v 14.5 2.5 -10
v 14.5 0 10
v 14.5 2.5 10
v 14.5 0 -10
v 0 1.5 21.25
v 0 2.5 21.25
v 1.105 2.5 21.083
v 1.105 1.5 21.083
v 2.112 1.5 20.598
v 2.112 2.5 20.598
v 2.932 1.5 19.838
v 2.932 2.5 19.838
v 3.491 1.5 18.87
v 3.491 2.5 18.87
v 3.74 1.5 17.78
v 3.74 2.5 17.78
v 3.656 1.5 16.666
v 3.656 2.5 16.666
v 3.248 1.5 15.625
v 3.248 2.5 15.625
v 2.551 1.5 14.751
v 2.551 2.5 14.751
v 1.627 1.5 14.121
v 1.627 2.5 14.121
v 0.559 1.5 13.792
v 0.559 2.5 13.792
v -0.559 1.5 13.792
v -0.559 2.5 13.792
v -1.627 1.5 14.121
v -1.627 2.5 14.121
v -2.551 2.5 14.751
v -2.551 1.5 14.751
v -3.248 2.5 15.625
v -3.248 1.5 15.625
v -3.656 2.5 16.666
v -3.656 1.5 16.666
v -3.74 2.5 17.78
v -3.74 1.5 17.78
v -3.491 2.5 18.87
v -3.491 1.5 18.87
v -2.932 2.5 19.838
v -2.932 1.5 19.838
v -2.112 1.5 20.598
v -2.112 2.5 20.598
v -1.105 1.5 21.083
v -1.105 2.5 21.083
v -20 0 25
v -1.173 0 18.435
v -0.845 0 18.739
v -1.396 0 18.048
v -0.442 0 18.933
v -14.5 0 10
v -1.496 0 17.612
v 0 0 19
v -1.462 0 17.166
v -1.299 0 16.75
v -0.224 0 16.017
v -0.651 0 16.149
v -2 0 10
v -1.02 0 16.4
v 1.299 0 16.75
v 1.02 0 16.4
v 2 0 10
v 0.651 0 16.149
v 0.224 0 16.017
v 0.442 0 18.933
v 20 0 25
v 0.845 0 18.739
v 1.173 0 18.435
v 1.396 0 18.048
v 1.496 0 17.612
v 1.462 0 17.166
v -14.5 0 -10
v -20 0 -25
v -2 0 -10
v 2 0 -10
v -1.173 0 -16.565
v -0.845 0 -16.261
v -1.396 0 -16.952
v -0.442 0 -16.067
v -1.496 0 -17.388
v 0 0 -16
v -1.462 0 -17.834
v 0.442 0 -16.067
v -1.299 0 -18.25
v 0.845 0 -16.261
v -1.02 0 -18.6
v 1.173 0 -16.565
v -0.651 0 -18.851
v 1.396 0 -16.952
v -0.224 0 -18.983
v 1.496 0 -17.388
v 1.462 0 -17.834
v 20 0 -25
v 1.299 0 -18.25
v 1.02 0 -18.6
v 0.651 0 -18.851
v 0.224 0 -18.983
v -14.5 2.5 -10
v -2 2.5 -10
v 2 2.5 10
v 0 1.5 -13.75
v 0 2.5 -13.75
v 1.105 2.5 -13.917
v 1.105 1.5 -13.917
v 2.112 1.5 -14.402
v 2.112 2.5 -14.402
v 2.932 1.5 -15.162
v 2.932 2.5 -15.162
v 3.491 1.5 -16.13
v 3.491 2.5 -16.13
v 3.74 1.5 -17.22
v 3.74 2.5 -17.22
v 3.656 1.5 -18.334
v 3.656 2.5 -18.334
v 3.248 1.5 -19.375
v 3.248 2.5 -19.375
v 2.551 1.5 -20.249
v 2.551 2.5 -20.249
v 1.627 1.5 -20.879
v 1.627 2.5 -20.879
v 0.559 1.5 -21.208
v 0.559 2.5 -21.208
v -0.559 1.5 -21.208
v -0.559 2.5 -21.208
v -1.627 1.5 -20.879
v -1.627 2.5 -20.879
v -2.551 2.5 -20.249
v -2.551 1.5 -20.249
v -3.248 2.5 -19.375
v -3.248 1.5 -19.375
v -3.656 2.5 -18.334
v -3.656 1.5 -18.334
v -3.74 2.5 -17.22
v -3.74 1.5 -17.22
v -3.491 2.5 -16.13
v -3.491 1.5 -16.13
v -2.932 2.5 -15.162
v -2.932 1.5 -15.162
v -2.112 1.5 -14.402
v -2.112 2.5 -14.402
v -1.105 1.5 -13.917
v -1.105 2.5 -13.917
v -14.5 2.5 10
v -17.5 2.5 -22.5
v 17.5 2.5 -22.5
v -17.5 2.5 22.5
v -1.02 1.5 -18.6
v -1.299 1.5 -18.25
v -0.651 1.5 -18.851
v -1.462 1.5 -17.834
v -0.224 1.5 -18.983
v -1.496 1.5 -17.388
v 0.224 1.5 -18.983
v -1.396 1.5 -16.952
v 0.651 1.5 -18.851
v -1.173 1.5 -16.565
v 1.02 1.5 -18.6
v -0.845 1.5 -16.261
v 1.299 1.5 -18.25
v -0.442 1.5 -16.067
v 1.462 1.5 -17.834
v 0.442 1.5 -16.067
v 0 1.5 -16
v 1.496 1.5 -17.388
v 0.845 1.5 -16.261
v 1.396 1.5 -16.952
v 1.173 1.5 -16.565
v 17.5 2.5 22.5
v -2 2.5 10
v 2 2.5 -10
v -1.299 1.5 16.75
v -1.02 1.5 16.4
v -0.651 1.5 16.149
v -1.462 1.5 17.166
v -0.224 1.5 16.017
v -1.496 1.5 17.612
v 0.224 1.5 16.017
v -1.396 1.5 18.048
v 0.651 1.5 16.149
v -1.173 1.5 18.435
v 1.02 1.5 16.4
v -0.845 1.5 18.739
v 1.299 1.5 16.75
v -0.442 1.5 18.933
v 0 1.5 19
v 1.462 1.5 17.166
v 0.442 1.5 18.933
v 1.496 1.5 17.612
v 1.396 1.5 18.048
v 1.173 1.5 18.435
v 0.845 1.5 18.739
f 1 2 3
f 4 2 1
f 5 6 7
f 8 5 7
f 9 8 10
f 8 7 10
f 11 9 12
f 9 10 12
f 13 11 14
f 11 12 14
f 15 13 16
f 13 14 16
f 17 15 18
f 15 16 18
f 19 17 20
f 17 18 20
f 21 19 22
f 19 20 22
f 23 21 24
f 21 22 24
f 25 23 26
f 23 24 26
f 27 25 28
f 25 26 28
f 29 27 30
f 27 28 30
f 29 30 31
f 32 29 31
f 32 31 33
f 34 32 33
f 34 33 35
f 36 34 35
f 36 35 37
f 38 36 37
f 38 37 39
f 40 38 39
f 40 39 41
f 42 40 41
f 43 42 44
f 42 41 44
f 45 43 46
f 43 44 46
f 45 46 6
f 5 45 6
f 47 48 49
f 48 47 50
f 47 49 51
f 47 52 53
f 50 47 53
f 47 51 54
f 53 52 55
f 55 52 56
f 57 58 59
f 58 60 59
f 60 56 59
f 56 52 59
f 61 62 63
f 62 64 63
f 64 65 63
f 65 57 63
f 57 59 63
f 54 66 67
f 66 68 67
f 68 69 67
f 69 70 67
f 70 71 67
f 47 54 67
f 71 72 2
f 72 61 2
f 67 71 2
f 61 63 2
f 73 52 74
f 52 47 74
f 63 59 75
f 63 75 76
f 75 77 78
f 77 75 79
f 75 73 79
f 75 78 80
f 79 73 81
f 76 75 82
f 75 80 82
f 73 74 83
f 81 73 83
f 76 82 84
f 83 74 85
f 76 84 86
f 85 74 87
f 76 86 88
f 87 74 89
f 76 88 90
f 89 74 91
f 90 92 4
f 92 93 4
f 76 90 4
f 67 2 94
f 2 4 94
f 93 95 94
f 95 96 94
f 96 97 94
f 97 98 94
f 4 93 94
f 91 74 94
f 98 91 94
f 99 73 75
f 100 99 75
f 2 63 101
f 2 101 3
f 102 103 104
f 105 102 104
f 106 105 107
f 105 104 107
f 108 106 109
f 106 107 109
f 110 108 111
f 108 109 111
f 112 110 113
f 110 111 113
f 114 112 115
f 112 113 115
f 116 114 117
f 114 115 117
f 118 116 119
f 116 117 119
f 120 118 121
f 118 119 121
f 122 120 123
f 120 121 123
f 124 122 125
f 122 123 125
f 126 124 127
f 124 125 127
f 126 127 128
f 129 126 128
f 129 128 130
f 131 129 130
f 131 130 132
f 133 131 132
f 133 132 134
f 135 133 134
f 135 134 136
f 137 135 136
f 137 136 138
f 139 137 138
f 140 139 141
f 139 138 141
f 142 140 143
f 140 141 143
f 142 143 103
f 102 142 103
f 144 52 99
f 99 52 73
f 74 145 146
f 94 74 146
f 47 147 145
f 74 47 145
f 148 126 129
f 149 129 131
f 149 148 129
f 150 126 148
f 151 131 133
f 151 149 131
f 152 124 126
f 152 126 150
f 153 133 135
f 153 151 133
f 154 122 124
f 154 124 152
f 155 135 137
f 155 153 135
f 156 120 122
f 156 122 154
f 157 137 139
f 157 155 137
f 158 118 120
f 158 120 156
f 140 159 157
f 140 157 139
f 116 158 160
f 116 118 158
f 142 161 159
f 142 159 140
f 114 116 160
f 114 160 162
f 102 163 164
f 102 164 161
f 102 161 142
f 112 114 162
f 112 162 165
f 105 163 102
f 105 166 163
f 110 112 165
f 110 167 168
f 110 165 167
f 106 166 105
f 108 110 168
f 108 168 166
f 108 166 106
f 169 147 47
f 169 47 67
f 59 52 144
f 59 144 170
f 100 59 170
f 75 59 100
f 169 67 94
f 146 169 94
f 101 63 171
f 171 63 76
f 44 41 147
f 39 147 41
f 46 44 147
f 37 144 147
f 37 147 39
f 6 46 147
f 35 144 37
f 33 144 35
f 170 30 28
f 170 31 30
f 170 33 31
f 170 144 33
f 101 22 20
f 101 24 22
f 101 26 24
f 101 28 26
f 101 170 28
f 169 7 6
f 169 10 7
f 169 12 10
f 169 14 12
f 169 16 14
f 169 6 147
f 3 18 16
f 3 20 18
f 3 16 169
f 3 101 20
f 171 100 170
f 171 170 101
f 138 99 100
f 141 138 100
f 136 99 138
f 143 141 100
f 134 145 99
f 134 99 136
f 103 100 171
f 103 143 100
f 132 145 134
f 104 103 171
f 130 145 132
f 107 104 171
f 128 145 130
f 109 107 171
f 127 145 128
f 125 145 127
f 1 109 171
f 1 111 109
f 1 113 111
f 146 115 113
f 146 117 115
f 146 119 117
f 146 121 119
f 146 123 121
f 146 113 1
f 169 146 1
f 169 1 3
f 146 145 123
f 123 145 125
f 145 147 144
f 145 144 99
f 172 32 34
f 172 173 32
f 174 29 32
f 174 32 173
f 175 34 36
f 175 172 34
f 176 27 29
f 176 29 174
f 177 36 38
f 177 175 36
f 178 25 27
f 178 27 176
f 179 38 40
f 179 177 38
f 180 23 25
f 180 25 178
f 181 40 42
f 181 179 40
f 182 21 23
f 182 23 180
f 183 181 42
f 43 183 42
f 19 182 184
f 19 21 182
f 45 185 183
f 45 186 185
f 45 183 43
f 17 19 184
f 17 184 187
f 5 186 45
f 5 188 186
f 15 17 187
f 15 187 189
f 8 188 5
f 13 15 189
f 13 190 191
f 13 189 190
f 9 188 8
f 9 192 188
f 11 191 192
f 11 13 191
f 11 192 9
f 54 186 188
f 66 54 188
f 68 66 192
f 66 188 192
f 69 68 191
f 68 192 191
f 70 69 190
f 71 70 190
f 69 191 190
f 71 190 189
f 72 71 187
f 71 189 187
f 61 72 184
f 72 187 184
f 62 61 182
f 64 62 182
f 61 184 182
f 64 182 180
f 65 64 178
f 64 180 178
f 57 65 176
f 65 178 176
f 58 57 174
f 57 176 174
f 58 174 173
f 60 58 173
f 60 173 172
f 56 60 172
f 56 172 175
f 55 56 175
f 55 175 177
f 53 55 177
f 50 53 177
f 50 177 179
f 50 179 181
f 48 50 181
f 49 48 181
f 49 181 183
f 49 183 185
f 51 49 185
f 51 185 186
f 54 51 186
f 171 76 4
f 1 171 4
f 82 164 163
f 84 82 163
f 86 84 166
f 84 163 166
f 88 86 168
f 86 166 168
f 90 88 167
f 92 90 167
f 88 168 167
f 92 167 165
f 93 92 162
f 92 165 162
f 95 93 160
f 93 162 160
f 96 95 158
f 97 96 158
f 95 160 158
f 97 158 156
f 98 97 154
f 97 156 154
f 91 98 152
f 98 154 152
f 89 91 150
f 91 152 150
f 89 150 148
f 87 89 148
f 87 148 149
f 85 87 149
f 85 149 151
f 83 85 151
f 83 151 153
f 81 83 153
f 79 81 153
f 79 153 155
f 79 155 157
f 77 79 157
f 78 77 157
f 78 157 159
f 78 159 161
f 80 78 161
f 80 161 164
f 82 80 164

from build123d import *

# Parameters (mm, degrees)
SKETCH1_W           = 40
SKETCH1_H           = 50
SKETCH1_W_2         = 12.5
SKETCH1_H_2         = 20
BOSS_EXTRUDE1_DEPTH = 2.5
SKETCH2_R           = 1.5
CUT_EXTRUDE1_DEPTH  = 10
SKETCH3_R           = 3.75
CUT_EXTRUDE2_DEPTH  = 1
CHAMFER1_SIZE       = 2.5


with BuildPart() as part:
    # Sketch1 → Boss-Extrude1 (new body)
    with BuildSketch(Plane(origin=(0, 0, 0), x_dir=(1, 0, 0), z_dir=(0, 1, 0))):
        Rectangle(SKETCH1_W, SKETCH1_H)
        with Locations((-8.25, 0)):
            Rectangle(SKETCH1_W_2, SKETCH1_H_2, mode=Mode.SUBTRACT)
        with Locations((8.25, 0)):
            Rectangle(SKETCH1_W_2, SKETCH1_H_2, mode=Mode.SUBTRACT)
    extrude(amount=BOSS_EXTRUDE1_DEPTH)

    # Sketch2 → Cut-Extrude1 (cut)
    with BuildSketch(Plane(origin=(0, 2.5, 0), x_dir=(1, 0, 0), z_dir=(0, 1, 0))):
        with Locations(Location((0, 17.5, 0), (0, 0, 270))):
            Circle(SKETCH2_R)
        with Locations(Location((0, -17.5, 0), (0, 0, 270))):
            Circle(SKETCH2_R)
    extrude(amount=-CUT_EXTRUDE1_DEPTH, mode=Mode.SUBTRACT)

    # Sketch3 → Cut-Extrude2 (cut)
    with BuildSketch(Plane(origin=(0, 2.5, 0), x_dir=(1, 0, 0), z_dir=(0, 1, 0))):
        with Locations(Location((0, 17.5, 0), (0, 0, 270))):
            Circle(SKETCH3_R)
        with Locations(Location((0, -17.5, 0), (0, 0, 270))):
            Circle(SKETCH3_R)
    extrude(amount=-CUT_EXTRUDE2_DEPTH, mode=Mode.SUBTRACT)

    # Chamfer1
    chamfer1_edges = [part.edges().sort_by_distance(p)[0] for p in [
        (20, 2.5, 0),
        (0, 2.5, 25),
        (0, 2.5, -25),
        (-20, 2.5, 0),
    ]]
    chamfer(chamfer1_edges, length=CHAMFER1_SIZE - 0.0001)  # a hair under: the kernel refuses the full size


solid = part.part
